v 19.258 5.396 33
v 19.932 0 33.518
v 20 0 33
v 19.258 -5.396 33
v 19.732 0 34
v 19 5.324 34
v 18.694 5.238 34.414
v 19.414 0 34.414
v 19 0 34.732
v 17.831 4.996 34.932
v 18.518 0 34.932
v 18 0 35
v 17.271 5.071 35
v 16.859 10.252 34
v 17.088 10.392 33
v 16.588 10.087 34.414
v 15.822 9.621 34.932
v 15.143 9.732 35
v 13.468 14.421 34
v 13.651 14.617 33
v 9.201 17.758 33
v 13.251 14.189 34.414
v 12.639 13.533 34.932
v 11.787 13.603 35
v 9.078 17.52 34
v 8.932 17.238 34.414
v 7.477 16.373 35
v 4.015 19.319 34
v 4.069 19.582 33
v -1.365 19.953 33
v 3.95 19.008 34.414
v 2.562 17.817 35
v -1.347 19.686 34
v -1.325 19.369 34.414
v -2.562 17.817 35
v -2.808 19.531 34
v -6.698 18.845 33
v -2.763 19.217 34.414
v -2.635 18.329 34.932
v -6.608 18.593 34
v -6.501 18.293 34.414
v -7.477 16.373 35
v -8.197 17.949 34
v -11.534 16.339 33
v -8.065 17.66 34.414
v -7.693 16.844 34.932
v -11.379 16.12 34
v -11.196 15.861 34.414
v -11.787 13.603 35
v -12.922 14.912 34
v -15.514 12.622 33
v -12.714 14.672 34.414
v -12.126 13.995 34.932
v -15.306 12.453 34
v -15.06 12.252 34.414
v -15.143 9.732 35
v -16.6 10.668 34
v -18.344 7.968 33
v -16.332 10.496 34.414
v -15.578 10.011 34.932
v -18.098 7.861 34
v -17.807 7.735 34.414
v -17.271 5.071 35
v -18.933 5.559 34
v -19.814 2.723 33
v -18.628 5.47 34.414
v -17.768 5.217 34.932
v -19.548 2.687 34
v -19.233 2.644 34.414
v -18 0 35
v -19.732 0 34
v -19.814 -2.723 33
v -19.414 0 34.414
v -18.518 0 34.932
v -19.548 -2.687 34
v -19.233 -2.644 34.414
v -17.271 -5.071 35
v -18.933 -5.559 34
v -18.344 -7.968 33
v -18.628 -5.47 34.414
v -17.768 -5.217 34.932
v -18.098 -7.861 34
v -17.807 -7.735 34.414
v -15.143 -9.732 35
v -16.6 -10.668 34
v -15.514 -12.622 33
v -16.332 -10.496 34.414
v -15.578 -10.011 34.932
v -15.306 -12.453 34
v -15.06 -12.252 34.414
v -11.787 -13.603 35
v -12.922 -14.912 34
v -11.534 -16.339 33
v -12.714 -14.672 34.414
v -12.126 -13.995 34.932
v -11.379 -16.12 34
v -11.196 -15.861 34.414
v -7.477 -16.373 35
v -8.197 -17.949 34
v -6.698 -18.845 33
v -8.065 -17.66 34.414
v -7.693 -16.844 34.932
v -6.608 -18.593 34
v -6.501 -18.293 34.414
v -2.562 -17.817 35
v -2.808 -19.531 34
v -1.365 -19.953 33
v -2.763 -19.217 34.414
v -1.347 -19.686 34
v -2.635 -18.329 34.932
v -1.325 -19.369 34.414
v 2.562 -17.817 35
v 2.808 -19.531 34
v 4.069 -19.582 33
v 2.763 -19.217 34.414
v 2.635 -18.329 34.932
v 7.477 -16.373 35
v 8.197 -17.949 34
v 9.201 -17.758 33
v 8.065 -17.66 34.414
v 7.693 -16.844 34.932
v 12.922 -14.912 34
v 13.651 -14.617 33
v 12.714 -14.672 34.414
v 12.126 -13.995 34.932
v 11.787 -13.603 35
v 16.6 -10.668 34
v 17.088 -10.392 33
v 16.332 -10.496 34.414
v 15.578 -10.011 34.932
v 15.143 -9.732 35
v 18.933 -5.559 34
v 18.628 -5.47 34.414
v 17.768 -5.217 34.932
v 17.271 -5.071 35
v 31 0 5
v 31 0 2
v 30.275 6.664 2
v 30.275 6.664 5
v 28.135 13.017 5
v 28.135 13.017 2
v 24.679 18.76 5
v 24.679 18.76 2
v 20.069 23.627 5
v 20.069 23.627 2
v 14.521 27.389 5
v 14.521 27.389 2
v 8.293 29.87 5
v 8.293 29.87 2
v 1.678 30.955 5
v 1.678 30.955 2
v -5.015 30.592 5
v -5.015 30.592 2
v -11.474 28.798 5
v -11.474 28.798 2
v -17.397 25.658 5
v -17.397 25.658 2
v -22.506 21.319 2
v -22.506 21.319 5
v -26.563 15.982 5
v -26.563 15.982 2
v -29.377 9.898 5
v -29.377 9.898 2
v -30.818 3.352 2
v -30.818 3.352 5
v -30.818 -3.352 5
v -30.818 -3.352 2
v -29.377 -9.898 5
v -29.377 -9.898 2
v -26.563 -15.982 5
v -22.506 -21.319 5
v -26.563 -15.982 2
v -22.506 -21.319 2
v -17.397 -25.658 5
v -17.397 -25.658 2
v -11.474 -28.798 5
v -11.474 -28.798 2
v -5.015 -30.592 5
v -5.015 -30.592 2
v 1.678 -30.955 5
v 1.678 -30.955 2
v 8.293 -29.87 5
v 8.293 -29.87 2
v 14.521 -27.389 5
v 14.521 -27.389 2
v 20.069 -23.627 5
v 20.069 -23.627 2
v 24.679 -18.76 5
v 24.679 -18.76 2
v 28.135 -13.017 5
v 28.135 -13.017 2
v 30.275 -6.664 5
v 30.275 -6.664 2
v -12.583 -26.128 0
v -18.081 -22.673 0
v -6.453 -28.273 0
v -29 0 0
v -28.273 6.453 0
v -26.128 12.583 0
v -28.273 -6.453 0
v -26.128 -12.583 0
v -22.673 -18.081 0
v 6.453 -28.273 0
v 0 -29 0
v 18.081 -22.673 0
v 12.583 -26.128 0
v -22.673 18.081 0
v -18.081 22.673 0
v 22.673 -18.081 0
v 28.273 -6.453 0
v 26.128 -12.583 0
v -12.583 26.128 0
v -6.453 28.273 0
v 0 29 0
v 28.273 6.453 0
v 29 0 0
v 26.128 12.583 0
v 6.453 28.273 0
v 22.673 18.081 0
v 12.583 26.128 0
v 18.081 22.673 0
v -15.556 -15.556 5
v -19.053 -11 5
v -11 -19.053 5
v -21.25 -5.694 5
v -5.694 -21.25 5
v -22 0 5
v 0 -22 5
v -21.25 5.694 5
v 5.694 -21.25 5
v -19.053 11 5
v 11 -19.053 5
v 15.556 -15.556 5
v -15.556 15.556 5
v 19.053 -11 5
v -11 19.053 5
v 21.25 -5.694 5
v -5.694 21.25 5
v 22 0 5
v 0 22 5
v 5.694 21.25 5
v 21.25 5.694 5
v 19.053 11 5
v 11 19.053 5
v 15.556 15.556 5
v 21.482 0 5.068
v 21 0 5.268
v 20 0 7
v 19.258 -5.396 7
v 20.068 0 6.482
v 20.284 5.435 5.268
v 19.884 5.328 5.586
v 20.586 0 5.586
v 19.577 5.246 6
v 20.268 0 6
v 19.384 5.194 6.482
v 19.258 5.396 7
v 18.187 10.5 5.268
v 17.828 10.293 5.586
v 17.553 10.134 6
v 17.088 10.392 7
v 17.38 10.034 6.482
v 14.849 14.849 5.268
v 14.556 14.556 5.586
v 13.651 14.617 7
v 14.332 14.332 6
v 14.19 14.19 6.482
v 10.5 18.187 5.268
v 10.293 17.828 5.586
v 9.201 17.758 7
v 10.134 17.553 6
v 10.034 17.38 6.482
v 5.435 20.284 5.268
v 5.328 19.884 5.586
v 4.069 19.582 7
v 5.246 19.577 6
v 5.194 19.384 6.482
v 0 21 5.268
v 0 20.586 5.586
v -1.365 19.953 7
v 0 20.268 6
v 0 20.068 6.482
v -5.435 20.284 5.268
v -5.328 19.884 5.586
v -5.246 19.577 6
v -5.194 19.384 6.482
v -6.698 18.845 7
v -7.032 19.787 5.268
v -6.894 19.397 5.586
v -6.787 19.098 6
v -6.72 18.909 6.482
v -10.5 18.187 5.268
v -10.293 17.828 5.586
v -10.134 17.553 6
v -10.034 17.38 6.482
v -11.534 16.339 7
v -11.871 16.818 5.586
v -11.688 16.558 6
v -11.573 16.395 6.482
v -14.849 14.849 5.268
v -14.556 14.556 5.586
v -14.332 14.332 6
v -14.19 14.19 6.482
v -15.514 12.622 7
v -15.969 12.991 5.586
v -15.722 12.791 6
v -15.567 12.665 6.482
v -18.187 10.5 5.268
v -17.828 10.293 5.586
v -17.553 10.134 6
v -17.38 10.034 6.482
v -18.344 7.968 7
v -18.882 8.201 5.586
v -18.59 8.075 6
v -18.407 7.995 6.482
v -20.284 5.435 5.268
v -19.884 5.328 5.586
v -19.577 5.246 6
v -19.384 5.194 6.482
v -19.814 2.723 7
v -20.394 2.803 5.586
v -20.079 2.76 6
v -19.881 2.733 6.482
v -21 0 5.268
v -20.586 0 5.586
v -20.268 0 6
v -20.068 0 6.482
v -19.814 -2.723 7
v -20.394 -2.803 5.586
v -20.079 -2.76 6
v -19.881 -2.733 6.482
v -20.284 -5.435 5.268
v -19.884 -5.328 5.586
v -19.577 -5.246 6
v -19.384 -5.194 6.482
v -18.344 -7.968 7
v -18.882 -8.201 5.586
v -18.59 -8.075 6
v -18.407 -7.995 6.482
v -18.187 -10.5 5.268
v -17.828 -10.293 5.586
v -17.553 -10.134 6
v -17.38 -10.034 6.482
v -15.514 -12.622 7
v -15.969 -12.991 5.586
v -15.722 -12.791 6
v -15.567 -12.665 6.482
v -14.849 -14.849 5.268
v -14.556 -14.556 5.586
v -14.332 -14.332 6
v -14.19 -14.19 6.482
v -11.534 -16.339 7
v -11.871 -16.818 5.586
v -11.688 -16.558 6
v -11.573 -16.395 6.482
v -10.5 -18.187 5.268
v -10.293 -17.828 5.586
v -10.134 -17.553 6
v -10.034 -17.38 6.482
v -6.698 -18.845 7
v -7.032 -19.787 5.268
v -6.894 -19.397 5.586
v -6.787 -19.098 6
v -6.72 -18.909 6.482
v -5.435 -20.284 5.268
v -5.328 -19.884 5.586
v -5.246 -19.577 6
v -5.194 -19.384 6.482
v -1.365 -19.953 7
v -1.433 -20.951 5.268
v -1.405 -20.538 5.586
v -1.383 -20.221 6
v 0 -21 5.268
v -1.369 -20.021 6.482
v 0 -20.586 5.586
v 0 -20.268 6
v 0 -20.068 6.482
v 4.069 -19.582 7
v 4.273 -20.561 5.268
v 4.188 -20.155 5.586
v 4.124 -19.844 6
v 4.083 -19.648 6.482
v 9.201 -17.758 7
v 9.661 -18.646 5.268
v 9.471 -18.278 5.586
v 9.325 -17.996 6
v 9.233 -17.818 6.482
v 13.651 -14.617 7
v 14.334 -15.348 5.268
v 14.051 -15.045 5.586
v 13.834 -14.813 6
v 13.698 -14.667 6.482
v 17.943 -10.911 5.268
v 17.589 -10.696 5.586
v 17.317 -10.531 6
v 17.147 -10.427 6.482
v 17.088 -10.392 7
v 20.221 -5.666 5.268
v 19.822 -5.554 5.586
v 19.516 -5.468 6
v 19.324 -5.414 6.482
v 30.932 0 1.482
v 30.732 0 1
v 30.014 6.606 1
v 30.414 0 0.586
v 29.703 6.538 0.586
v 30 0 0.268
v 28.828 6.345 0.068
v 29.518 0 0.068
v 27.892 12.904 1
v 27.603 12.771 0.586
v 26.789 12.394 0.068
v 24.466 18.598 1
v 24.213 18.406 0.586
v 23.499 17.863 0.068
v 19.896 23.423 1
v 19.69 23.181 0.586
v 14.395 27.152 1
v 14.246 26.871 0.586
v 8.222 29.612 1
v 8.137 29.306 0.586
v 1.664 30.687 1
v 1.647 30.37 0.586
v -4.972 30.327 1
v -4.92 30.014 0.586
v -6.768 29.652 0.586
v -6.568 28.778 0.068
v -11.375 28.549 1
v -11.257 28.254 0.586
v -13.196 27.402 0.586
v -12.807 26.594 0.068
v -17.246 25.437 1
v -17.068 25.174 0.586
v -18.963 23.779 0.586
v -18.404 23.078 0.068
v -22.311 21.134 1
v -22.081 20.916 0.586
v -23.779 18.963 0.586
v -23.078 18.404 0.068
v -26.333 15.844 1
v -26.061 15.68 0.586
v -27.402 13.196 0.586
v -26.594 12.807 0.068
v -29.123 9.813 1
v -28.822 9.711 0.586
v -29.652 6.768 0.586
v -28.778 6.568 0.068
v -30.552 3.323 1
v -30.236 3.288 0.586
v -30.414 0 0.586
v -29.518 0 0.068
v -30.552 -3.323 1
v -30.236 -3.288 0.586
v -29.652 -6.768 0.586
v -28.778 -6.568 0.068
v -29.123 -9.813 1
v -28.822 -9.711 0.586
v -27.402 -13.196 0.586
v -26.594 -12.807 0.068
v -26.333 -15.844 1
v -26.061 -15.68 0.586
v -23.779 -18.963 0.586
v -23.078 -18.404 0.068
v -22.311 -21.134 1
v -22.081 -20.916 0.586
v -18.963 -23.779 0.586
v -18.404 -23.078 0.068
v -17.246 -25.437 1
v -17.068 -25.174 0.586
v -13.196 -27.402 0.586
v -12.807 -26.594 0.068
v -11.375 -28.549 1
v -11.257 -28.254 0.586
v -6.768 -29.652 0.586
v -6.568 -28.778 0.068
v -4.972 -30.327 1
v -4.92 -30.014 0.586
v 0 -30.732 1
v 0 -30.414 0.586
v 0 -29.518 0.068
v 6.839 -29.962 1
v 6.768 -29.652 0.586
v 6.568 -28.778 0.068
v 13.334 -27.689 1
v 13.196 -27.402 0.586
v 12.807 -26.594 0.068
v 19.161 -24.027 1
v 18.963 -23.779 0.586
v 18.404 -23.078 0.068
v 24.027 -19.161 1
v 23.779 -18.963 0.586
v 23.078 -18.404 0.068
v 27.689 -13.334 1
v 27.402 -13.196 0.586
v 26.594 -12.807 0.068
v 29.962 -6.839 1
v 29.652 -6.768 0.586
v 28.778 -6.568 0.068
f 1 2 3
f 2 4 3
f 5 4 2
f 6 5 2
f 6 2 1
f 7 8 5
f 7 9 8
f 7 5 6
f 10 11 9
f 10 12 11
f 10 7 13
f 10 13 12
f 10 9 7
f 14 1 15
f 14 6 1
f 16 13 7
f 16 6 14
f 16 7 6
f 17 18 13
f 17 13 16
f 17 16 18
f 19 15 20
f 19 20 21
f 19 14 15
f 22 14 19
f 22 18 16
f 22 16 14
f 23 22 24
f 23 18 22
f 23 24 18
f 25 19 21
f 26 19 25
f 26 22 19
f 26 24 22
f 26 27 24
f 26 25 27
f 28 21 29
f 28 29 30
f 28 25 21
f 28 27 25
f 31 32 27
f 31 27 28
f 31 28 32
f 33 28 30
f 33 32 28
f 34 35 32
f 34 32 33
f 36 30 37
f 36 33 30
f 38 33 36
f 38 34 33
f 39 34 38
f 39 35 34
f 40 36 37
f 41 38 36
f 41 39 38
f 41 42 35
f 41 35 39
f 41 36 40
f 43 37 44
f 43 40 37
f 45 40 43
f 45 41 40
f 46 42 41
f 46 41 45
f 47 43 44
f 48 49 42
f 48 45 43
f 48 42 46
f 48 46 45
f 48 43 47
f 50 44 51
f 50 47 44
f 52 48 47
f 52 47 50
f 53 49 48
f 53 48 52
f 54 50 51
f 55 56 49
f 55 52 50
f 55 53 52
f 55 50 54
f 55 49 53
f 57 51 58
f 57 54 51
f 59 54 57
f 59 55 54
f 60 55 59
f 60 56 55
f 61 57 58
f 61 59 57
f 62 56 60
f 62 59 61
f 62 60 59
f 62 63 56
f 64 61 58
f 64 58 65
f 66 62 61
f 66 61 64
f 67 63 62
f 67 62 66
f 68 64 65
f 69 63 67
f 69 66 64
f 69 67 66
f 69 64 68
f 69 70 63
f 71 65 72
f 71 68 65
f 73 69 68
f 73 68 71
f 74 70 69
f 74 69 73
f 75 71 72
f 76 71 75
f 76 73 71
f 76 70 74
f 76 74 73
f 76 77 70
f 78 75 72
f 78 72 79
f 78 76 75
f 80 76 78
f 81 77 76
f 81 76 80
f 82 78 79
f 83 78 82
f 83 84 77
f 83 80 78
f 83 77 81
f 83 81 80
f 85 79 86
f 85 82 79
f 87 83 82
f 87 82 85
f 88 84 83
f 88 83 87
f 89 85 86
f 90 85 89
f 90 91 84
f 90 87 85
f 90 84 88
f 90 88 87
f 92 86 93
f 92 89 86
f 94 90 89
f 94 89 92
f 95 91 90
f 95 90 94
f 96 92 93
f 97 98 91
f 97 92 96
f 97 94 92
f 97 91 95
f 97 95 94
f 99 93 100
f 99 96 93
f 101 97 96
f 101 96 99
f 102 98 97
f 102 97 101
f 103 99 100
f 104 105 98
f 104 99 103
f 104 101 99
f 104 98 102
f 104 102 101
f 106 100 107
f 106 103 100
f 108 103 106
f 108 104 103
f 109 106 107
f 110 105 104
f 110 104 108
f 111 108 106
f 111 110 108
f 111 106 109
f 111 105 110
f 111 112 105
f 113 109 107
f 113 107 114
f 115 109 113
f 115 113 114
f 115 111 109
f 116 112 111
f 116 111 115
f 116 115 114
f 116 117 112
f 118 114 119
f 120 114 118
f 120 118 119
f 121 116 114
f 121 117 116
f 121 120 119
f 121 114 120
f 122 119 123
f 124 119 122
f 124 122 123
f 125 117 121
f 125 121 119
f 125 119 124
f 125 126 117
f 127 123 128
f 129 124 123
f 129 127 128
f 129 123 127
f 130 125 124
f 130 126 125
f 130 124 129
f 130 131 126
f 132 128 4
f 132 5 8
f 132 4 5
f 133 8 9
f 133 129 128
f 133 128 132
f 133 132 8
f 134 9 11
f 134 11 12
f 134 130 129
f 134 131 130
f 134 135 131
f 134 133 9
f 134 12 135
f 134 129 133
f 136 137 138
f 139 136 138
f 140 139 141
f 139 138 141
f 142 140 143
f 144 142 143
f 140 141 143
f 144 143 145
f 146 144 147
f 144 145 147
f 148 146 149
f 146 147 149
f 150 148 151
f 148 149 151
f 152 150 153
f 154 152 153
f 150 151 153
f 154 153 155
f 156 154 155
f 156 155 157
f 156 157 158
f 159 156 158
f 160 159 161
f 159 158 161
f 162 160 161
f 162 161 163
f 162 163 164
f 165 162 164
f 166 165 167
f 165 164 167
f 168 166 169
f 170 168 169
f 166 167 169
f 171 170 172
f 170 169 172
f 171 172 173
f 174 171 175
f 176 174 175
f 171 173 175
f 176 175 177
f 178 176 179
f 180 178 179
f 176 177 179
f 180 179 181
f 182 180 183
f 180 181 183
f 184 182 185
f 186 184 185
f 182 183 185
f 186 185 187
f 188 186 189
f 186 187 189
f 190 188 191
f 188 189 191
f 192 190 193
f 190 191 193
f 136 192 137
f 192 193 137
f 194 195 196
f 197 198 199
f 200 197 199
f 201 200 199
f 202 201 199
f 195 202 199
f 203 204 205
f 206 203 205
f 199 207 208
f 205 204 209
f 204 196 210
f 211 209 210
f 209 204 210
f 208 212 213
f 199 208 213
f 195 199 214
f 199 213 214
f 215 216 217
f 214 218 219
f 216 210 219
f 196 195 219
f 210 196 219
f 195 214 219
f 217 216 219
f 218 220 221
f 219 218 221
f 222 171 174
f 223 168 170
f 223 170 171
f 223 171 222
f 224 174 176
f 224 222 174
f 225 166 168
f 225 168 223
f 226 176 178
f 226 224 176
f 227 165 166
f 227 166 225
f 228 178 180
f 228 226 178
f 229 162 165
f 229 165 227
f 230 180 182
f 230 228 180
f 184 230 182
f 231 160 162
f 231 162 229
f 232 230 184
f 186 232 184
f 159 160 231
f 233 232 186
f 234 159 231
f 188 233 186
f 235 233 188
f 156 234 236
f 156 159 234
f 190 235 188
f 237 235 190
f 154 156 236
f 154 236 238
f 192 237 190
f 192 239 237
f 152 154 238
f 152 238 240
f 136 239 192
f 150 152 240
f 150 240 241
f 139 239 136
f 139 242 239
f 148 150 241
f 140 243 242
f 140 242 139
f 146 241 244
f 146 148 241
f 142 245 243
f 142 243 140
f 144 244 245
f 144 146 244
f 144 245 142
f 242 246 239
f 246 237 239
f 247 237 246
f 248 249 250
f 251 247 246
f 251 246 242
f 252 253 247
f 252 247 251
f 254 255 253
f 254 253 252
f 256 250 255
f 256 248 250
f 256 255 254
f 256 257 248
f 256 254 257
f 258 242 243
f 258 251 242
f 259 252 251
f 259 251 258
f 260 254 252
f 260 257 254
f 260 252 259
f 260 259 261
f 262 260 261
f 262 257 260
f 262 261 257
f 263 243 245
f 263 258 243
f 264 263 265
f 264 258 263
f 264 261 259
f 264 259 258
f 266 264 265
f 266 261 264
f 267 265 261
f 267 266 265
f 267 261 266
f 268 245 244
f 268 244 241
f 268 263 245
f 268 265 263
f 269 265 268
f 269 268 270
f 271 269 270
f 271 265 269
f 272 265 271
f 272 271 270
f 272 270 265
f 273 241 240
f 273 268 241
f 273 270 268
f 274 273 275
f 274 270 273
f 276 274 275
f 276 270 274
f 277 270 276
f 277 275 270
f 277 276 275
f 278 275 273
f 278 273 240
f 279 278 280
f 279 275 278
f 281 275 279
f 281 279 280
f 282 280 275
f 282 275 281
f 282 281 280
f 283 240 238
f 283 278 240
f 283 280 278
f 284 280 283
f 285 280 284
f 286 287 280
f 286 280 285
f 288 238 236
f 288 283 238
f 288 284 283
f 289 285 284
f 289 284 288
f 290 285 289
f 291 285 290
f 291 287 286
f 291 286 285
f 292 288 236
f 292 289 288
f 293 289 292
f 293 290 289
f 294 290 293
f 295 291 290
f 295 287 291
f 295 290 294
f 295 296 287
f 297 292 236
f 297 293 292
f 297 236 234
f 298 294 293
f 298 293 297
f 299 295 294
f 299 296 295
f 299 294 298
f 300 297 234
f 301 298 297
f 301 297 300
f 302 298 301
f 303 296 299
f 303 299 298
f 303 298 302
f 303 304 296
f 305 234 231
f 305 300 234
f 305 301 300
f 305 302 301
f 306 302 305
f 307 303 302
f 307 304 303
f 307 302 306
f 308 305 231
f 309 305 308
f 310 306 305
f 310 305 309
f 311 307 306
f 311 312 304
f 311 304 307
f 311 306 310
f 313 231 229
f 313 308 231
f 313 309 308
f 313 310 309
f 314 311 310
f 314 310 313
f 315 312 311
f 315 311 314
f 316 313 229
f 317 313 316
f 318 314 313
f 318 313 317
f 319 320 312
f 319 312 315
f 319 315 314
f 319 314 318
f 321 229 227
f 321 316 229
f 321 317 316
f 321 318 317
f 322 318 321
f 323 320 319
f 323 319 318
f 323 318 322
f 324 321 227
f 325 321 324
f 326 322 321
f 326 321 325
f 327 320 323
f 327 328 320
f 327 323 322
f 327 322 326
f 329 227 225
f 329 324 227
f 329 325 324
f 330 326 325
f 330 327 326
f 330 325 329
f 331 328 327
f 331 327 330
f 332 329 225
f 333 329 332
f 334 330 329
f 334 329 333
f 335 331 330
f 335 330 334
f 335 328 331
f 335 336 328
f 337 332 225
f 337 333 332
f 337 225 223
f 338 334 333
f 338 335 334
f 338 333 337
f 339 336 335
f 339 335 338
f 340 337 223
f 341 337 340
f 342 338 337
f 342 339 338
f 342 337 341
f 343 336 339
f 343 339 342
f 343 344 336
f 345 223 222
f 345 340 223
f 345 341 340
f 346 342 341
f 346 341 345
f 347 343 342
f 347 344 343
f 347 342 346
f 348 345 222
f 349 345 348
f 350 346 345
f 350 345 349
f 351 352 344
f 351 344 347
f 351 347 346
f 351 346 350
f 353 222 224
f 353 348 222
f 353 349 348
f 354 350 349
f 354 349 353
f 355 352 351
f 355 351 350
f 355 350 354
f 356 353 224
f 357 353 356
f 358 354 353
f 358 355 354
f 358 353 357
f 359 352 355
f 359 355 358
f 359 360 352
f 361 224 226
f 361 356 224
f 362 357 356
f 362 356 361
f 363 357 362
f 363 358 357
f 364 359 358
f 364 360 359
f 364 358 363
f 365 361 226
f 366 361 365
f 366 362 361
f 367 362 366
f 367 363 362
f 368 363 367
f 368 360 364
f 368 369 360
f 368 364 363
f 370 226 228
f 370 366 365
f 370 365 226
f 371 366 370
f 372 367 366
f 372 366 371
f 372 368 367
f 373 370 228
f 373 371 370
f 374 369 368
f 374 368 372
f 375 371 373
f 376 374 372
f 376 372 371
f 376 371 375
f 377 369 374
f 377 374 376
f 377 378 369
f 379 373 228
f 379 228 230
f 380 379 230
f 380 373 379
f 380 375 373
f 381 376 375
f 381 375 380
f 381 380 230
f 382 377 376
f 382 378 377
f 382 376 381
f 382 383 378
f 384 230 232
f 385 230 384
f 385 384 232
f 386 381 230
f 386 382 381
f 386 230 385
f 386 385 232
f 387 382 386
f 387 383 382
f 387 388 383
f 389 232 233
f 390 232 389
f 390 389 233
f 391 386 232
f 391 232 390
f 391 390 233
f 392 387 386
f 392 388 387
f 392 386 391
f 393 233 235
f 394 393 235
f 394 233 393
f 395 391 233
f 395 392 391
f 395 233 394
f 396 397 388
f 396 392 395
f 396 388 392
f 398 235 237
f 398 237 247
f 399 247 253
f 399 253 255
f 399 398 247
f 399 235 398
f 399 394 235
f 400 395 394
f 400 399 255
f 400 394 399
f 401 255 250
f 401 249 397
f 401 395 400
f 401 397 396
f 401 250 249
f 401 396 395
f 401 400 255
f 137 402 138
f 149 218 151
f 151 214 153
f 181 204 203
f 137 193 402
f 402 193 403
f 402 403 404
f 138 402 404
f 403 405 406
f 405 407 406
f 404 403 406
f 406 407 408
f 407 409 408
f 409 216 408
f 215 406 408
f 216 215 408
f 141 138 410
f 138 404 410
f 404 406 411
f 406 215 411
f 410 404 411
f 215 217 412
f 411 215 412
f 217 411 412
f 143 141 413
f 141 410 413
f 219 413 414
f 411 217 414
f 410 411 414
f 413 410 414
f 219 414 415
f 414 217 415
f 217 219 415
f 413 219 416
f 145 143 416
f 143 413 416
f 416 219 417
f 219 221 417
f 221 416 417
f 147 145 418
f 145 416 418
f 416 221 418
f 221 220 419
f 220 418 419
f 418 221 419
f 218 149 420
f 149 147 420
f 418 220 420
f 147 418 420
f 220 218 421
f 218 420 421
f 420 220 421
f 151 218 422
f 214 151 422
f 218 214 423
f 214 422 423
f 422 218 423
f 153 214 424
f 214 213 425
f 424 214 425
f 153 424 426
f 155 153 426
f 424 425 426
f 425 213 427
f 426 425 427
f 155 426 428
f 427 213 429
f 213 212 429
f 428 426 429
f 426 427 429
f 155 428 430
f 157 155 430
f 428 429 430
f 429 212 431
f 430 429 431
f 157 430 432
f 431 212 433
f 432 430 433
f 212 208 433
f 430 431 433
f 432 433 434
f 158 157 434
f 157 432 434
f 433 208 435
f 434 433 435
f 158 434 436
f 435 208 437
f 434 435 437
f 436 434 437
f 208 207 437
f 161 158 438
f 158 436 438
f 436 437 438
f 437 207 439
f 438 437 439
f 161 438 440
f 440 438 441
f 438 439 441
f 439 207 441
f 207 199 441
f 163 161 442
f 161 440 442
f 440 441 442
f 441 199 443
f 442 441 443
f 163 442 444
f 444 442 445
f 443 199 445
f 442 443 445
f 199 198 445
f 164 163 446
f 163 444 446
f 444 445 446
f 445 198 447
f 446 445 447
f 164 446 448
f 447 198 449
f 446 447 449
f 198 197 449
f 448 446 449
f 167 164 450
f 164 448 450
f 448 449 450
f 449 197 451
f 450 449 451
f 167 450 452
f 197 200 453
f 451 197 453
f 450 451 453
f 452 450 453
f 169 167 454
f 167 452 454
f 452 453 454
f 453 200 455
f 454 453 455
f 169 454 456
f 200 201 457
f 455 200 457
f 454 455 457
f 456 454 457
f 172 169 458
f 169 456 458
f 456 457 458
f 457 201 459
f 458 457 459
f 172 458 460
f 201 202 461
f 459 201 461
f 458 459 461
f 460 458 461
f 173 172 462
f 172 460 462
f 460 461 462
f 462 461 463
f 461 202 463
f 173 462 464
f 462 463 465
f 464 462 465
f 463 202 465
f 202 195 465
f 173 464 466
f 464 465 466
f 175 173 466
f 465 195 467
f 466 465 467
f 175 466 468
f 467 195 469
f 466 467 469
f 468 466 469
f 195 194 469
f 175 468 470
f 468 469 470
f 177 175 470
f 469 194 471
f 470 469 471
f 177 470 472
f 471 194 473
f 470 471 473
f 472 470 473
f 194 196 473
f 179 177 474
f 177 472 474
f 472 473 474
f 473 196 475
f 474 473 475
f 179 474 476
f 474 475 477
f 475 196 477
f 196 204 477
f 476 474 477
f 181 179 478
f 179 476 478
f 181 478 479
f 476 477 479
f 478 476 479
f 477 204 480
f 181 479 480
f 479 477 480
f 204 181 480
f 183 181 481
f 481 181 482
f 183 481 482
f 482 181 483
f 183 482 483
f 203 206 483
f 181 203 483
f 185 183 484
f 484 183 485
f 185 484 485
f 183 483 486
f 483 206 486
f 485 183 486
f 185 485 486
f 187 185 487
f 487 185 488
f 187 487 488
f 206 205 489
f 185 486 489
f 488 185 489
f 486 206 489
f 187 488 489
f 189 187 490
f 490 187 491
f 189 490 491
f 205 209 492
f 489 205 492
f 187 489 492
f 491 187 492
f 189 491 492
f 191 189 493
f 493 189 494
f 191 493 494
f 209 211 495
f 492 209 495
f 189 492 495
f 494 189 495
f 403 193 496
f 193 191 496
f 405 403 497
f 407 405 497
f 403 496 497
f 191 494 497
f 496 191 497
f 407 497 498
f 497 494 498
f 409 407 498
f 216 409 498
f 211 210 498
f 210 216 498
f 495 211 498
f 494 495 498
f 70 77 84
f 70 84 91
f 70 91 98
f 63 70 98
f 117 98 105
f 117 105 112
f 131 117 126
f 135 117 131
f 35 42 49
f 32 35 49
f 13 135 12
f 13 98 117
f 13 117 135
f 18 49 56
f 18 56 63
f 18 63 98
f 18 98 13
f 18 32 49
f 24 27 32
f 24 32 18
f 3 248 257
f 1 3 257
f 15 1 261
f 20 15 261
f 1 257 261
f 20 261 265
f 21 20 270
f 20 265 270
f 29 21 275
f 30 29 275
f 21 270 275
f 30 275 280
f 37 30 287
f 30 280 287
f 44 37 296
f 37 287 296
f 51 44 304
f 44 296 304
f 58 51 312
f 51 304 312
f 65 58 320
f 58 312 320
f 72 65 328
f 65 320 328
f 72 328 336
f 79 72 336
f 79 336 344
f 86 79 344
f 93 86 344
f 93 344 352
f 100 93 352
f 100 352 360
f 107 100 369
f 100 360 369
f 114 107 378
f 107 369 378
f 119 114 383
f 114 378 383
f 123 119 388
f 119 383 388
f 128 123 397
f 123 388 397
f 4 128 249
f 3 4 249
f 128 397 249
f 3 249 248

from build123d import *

# Parameters (mm, degrees)
F0_R     = 31
F1_DEPTH = 5
F2_R     = 20
F3_DEPTH = 30
F4_R     = 2


with BuildPart() as f1:
    # F0 (on Top) → F1 (new body)
    with BuildSketch(Plane.XY):
        Circle(F0_R)
    extrude(amount=F1_DEPTH)

    # F2 (on face) → F3 (join)
    with BuildSketch(Plane.XY.offset(5)):
        Circle(F2_R)
    extrude(amount=F3_DEPTH)

    # F4
    f4_edges = [f1.edges().sort_by_distance(p)[0] for p in [
        (-20, 0, 35),
        (-20, 0, 5),
        (-31, 0, 0),
    ]]
    fillet(f4_edges, radius=F4_R)


solid = f1.part
